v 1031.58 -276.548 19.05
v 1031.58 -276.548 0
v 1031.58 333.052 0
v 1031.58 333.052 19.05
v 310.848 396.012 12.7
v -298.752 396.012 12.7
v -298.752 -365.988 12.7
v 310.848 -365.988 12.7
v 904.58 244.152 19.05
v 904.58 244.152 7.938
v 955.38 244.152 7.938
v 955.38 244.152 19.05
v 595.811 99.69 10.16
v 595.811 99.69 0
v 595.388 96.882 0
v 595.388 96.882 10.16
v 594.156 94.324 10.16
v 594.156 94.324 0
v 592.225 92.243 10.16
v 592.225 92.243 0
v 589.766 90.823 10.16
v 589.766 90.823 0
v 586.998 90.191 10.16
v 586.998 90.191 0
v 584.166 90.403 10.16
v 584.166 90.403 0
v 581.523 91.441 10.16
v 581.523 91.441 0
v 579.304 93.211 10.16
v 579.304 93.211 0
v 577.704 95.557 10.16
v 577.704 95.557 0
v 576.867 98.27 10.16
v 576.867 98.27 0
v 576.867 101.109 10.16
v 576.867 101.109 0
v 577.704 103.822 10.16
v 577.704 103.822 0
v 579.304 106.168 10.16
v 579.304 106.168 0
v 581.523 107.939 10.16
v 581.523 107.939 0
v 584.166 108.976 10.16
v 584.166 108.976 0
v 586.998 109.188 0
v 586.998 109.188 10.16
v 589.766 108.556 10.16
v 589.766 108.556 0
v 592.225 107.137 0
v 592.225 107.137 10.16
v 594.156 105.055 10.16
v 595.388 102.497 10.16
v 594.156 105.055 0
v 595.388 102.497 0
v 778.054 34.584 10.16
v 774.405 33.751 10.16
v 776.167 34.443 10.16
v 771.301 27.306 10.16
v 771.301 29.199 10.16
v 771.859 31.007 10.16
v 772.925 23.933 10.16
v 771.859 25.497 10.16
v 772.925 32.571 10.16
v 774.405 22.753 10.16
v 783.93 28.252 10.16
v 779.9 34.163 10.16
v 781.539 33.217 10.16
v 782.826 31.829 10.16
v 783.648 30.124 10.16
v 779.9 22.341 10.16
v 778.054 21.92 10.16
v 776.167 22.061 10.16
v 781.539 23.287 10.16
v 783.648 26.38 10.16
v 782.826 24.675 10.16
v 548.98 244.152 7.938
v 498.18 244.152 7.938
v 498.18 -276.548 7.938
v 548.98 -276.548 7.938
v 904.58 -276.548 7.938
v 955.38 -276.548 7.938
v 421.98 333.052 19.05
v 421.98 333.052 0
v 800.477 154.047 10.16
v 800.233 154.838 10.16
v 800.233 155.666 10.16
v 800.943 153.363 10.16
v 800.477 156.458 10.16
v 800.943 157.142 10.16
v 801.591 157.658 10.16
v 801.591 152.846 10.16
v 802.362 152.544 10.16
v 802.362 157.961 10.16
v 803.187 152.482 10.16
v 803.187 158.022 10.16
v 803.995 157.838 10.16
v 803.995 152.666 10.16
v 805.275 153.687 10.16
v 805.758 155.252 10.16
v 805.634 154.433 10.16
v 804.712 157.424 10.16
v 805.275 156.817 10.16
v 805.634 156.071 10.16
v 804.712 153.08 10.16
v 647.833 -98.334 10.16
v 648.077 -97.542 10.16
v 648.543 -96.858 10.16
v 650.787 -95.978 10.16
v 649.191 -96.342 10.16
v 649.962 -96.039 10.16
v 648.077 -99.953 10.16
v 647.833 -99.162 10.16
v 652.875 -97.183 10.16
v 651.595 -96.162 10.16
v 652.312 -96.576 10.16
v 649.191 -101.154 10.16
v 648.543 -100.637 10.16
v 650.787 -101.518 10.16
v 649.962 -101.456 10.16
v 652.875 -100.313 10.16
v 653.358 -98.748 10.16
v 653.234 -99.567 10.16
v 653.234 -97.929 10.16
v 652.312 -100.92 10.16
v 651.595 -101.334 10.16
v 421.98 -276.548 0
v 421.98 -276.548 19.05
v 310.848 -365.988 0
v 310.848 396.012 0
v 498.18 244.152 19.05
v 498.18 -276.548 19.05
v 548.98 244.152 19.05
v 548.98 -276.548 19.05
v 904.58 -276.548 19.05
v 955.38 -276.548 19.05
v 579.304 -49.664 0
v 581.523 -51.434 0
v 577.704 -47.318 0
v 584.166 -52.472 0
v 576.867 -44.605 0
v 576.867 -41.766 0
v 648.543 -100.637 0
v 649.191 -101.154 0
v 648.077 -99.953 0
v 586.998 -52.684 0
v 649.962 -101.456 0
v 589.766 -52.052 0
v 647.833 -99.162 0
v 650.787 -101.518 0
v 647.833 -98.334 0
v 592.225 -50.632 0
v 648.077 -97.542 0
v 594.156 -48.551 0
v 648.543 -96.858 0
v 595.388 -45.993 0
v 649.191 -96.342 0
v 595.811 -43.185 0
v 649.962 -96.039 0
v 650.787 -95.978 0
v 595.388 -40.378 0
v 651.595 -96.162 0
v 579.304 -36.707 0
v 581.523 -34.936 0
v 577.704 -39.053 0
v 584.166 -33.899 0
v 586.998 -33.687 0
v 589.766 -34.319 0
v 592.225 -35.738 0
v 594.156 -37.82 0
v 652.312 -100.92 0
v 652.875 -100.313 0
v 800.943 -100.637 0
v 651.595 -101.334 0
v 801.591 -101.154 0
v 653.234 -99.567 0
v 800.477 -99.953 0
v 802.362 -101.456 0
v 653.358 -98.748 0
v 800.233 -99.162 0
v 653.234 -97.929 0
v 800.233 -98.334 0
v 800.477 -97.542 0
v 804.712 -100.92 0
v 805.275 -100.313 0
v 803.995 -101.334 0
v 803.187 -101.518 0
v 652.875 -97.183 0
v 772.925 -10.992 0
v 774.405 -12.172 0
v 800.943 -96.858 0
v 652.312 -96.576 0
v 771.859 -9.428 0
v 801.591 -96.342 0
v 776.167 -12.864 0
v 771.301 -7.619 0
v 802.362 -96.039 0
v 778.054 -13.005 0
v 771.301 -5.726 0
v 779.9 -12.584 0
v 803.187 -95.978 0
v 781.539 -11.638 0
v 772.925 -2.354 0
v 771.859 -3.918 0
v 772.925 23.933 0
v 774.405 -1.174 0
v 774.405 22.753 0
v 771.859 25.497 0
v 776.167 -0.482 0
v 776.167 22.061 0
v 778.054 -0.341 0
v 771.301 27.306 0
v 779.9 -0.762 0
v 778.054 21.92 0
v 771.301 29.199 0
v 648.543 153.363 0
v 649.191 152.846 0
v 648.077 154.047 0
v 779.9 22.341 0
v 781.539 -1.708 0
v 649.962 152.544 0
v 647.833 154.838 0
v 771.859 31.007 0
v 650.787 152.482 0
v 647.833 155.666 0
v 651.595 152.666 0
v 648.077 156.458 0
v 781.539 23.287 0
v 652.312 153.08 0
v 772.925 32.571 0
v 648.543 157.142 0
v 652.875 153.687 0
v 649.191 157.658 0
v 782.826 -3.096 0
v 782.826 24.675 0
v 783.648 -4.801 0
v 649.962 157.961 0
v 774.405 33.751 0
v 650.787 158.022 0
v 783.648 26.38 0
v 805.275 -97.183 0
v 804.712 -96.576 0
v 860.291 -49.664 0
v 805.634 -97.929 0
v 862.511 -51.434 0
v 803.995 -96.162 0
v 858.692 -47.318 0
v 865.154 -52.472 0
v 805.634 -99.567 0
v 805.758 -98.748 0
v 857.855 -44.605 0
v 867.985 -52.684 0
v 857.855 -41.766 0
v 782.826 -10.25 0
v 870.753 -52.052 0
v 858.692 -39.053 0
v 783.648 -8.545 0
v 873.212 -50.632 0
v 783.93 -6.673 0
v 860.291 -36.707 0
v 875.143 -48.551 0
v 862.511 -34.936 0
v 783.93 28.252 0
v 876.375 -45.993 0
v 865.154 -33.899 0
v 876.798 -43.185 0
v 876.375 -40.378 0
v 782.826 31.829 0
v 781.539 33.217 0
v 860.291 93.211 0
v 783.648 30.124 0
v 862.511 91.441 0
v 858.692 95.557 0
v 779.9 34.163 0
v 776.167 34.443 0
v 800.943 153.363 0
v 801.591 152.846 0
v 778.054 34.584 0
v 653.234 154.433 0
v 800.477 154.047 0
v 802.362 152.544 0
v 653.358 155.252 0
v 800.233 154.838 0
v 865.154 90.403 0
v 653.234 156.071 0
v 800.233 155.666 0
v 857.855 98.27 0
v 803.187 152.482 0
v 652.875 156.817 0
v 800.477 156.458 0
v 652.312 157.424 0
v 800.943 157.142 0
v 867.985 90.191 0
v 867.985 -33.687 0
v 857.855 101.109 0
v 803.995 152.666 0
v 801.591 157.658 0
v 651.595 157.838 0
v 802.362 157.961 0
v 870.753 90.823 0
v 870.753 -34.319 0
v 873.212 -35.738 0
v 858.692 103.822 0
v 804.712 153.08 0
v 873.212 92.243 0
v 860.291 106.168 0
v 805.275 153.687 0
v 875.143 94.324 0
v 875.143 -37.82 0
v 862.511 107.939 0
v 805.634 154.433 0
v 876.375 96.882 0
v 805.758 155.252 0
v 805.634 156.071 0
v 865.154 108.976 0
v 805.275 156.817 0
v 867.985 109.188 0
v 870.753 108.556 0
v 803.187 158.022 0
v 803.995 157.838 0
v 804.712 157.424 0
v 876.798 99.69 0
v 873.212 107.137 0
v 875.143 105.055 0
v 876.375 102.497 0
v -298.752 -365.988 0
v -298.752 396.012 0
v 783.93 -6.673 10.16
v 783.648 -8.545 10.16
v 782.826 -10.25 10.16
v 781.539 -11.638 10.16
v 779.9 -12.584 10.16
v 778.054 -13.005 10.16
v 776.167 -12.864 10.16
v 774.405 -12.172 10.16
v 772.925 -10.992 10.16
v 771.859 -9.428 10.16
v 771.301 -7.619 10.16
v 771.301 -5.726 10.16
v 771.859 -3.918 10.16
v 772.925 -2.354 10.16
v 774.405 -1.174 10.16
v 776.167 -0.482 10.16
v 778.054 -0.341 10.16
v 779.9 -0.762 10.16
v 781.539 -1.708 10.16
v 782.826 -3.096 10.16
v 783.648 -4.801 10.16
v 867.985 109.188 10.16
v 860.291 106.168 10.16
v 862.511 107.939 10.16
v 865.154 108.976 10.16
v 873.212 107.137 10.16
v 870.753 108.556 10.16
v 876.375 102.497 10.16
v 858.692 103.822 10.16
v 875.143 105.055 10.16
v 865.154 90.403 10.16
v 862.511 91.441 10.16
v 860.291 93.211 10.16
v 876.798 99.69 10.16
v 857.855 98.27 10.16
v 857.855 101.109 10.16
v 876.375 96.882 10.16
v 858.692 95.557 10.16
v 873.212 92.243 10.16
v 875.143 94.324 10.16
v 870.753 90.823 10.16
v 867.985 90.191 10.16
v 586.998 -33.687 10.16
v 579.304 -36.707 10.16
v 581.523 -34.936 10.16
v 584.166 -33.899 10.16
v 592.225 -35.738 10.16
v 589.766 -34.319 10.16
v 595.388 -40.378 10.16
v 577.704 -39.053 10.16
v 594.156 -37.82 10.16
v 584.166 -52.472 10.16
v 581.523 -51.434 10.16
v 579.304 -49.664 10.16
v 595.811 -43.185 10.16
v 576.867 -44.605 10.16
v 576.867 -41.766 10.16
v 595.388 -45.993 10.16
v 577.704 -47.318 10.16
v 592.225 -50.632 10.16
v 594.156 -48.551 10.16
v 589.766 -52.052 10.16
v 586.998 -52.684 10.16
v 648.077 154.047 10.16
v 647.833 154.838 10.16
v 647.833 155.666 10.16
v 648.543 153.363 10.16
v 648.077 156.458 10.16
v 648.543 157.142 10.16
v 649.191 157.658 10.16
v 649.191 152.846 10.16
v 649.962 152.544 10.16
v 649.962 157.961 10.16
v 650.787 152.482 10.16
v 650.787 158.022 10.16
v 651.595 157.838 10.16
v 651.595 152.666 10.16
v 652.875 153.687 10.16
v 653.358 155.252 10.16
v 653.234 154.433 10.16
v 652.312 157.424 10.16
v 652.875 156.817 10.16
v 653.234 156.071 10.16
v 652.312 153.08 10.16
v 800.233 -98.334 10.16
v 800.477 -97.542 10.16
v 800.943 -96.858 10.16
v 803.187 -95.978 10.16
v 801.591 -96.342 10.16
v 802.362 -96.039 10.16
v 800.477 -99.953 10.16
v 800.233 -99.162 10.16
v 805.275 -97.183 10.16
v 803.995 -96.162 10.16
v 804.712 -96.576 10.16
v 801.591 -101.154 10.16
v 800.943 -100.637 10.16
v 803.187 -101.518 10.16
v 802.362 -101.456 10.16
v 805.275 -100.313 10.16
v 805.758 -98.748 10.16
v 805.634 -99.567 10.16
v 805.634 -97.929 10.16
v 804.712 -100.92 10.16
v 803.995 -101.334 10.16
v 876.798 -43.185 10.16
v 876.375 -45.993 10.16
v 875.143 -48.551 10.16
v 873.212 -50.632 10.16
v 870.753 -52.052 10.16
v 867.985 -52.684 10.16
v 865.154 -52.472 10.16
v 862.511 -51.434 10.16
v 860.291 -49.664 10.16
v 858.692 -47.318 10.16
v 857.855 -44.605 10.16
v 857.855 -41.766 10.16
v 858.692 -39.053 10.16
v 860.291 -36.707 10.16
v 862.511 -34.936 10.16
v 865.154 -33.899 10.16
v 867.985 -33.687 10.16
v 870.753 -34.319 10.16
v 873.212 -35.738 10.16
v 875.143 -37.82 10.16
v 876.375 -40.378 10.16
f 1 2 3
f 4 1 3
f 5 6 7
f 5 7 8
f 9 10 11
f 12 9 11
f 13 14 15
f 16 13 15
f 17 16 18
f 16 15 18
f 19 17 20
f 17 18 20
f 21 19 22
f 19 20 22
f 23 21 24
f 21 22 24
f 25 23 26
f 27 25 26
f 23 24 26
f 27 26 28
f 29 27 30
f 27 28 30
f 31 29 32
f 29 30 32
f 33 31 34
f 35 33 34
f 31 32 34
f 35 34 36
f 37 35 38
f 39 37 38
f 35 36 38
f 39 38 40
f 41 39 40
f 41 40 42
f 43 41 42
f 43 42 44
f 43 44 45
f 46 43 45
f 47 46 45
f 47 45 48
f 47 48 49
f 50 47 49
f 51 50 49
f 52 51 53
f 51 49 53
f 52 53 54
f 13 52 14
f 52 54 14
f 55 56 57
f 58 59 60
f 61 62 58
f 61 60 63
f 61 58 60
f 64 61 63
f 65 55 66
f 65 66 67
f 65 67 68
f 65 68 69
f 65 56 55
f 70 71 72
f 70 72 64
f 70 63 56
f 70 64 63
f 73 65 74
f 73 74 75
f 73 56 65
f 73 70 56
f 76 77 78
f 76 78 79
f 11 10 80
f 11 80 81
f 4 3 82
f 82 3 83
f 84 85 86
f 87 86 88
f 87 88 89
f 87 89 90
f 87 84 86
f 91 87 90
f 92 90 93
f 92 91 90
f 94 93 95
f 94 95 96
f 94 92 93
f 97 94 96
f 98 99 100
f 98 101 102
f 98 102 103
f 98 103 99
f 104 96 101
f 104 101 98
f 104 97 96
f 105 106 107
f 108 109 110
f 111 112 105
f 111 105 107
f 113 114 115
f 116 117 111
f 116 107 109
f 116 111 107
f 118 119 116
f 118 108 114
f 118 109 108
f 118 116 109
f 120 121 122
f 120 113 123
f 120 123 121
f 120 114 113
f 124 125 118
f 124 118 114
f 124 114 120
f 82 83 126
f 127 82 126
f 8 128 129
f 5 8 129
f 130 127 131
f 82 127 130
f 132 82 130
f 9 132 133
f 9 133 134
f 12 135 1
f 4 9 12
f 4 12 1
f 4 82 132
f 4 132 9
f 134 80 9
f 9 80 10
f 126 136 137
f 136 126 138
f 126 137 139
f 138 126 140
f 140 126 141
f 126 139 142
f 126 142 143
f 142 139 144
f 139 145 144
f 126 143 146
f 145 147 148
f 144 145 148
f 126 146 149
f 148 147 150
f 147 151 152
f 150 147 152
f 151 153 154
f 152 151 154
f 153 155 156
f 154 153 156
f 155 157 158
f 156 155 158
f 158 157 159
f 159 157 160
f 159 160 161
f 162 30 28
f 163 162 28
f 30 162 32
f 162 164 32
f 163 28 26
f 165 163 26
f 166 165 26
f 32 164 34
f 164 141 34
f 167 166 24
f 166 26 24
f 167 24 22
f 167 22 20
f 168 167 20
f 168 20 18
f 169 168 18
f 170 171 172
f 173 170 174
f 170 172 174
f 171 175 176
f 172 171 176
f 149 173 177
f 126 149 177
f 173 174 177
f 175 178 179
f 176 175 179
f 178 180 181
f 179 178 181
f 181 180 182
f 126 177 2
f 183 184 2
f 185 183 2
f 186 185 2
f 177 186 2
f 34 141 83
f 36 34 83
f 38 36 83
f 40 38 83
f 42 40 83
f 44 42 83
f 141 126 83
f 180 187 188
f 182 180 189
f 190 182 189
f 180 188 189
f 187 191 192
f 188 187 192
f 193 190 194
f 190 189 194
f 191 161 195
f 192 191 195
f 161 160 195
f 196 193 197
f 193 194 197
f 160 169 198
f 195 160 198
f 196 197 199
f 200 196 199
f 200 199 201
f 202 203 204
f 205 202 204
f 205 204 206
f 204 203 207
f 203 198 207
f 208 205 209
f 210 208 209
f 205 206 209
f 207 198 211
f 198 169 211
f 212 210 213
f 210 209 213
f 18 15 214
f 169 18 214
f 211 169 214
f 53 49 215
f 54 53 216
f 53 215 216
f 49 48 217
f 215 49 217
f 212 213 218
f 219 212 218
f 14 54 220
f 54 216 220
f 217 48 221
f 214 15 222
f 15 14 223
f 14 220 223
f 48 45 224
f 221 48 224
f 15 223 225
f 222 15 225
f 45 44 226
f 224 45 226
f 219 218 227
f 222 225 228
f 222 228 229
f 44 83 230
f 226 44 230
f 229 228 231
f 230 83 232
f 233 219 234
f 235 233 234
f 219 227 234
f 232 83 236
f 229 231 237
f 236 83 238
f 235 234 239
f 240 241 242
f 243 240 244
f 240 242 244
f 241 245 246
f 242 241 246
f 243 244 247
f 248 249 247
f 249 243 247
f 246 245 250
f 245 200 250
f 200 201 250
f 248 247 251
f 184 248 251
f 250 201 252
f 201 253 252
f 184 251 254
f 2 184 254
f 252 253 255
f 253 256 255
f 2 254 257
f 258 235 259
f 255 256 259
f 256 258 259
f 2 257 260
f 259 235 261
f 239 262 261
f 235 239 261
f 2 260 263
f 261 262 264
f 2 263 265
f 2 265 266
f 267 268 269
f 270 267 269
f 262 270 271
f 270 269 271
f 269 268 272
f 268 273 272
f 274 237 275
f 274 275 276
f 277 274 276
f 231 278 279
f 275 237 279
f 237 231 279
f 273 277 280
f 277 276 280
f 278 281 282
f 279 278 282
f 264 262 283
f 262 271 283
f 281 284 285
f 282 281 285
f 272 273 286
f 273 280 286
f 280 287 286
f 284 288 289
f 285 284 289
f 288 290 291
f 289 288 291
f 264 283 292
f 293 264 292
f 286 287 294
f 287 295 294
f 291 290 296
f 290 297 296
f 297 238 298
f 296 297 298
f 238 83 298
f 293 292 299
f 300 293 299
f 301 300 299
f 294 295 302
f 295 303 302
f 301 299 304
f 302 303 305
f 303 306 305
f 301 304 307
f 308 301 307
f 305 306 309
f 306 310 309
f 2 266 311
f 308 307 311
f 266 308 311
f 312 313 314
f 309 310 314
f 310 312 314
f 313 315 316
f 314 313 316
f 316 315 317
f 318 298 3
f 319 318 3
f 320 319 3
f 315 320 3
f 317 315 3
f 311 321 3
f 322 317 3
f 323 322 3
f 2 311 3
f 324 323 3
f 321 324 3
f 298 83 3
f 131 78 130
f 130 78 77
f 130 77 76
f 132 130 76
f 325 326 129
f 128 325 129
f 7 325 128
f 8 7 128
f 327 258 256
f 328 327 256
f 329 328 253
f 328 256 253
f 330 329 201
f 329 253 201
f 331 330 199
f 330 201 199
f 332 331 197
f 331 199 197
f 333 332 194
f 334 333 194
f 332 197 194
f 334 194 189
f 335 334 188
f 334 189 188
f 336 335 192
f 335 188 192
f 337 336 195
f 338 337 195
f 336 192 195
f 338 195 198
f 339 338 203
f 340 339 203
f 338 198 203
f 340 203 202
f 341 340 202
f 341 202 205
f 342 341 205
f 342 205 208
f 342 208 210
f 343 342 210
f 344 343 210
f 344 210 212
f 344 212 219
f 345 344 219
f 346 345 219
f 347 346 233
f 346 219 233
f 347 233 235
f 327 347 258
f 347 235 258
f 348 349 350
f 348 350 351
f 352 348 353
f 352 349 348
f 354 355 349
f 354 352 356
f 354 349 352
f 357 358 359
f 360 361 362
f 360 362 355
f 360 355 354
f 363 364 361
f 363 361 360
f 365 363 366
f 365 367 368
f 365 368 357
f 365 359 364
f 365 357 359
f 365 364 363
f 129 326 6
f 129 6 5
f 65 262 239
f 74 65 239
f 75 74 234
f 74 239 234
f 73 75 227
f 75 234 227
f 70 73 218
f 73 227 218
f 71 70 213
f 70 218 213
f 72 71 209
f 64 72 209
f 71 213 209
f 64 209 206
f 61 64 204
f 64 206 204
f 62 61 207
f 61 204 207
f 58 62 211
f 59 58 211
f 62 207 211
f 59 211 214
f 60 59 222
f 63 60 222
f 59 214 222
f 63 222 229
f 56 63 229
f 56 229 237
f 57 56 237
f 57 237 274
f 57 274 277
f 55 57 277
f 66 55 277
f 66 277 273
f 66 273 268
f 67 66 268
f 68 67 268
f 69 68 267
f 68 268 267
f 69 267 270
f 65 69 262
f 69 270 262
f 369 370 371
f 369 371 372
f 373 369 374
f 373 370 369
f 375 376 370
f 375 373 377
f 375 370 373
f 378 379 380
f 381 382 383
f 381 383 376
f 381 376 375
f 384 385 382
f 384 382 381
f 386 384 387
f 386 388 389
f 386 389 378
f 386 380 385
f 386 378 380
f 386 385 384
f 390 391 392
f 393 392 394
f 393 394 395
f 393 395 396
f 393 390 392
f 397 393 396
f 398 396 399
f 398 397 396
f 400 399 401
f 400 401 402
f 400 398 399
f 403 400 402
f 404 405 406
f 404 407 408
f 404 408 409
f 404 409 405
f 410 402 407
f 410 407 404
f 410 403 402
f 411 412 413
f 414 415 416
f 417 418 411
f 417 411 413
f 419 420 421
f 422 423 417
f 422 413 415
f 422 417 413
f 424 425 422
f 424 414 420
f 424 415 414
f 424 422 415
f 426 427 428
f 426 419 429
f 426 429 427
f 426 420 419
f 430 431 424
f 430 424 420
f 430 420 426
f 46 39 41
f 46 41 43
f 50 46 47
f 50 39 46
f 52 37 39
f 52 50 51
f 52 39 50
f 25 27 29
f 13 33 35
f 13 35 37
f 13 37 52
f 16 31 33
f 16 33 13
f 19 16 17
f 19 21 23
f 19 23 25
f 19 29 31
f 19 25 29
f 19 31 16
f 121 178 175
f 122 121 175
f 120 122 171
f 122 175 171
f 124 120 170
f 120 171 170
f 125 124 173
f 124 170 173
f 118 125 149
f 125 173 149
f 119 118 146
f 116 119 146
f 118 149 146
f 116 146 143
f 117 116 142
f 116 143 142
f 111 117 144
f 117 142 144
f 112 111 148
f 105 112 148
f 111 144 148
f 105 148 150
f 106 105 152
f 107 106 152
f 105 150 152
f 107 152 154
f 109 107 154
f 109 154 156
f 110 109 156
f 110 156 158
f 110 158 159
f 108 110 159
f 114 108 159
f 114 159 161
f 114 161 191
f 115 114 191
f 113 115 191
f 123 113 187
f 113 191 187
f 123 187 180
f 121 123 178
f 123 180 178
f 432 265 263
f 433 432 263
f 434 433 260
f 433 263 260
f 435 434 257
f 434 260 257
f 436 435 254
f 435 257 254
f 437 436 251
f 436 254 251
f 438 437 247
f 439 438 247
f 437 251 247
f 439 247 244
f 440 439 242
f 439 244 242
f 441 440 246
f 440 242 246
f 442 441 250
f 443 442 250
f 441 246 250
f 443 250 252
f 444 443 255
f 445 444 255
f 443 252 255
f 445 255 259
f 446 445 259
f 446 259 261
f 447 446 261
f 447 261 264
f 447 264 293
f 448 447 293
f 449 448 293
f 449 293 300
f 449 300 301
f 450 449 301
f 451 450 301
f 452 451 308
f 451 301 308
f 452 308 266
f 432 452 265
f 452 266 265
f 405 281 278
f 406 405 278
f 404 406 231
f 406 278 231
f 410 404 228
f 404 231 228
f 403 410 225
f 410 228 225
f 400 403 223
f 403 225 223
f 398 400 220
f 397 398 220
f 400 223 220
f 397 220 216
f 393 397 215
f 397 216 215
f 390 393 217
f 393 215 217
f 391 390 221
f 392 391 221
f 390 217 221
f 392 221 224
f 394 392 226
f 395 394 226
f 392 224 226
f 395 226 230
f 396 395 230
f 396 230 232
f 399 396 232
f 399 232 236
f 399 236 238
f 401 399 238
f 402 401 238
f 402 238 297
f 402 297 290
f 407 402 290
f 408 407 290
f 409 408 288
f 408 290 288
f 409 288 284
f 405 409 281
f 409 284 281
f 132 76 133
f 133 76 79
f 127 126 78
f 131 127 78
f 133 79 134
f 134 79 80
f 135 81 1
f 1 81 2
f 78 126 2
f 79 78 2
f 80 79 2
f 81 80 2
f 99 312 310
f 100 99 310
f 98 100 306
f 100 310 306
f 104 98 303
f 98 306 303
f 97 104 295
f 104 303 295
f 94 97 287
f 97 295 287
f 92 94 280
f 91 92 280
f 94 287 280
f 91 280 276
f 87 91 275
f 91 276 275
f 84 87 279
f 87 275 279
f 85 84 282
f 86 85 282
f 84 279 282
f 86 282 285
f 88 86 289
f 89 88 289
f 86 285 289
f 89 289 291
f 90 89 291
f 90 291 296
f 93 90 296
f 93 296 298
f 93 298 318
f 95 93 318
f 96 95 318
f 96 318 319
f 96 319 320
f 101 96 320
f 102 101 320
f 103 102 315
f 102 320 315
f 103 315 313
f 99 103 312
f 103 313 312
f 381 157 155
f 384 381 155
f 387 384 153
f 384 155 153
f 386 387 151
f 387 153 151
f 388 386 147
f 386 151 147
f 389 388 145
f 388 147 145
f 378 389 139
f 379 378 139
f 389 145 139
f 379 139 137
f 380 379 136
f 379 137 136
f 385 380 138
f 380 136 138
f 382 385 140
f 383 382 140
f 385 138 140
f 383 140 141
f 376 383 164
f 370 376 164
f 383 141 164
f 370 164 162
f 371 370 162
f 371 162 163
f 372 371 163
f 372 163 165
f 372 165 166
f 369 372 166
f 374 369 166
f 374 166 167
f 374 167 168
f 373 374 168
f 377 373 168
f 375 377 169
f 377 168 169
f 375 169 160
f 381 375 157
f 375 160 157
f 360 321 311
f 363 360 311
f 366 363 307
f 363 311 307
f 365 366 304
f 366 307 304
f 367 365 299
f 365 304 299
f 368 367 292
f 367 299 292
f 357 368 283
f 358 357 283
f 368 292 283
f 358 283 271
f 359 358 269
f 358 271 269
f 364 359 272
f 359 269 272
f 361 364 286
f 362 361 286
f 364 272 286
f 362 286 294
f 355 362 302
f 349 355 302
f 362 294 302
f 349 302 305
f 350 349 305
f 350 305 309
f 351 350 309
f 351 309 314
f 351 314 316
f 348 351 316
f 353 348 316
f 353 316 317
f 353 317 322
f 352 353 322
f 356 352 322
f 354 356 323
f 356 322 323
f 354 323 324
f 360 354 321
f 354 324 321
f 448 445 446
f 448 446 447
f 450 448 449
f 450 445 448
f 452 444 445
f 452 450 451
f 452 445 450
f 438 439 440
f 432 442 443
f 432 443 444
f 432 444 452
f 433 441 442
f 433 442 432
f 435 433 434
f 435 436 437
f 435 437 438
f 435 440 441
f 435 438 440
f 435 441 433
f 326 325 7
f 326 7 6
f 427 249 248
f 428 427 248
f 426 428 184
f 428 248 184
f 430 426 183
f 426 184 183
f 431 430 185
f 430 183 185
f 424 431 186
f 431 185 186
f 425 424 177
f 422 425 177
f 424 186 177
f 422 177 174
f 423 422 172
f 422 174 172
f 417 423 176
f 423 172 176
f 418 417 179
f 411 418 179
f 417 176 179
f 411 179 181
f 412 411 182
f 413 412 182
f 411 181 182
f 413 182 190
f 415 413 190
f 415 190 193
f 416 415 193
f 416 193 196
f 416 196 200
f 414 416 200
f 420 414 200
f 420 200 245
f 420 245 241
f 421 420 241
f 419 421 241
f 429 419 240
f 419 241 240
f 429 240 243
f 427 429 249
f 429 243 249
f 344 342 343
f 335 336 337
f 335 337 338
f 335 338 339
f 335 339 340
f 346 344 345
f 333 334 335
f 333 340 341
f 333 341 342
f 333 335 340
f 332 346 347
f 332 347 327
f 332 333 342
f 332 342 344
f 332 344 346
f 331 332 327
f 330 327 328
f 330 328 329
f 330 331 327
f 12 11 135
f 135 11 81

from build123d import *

# Parameters (mm, degrees)
F0_W     = 609.6
F0_H     = 762
F1_DEPTH = 12.7
F0_H_2   = 609.6
F2_DEPTH = 7.9375
F4_DEPTH = 11.1125
F5_R     = 2.778125
F5_R_2   = 9.525
F5_R_3   = 6.35
F6_DEPTH = 10.16


with BuildPart() as f1:
    # F0 (on Top) → F1 (new body)
    with BuildSketch(Plane.XY):
        with Locations((6.048253, 15.011625)):
            Rectangle(F0_W, F0_H)
    extrude(amount=F1_DEPTH)


with BuildPart() as f2:
    # F0 (on Top) → F2 (new body)
    with BuildSketch(Plane.XY):
        with Locations((726.779733, 28.252121)):
            Rectangle(F0_W, F0_H_2)
    extrude(amount=F2_DEPTH)

    # F3 (on face) → F4 (join)
    with BuildSketch(Plane.XY.offset(7.9375)):
        Polygon((421.979733, -276.547879), (498.179733, -276.547879), (498.179733, 244.152121), (548.979733, 244.152121), (548.979733, -276.547879), (904.579733, -276.547879), (904.579733, 244.152121), (955.379733, 244.152121), (955.379733, -276.547879), (1031.579733, -276.547879), (1031.579733, 333.052121), (421.979733, 333.052121), align=None)
    extrude(amount=F4_DEPTH)

    # F5 (on face) → F6 (cut)
    with BuildSketch(Plane(origin=(0, 0, 0), x_dir=(1, 0, 0), z_dir=(0, 0, -1))):
        with Locations((650.579733, -155.252121)):
            Circle(F5_R)
        with Locations((802.979733, -155.252121)):
            Circle(F5_R)
        with Locations((650.579733, 98.747879)):
            Circle(F5_R)
        with Locations((802.979733, 98.747879)):
            Circle(F5_R)
        with Locations((586.285983, -99.689621)):
            Circle(F5_R_2)
        with Locations((867.273483, -99.689621)):
            Circle(F5_R_2)
        with Locations((586.285983, 43.185379)):
            Circle(F5_R_2)
        with Locations((867.273483, 43.185379)):
            Circle(F5_R_2)
        with Locations((777.579733, -28.252121)):
            Circle(F5_R_3)
        with Locations((777.579733, 6.672879)):
            Circle(F5_R_3)
    extrude(amount=-F6_DEPTH, mode=Mode.SUBTRACT)


solid = Compound([f1.part, f2.part])
